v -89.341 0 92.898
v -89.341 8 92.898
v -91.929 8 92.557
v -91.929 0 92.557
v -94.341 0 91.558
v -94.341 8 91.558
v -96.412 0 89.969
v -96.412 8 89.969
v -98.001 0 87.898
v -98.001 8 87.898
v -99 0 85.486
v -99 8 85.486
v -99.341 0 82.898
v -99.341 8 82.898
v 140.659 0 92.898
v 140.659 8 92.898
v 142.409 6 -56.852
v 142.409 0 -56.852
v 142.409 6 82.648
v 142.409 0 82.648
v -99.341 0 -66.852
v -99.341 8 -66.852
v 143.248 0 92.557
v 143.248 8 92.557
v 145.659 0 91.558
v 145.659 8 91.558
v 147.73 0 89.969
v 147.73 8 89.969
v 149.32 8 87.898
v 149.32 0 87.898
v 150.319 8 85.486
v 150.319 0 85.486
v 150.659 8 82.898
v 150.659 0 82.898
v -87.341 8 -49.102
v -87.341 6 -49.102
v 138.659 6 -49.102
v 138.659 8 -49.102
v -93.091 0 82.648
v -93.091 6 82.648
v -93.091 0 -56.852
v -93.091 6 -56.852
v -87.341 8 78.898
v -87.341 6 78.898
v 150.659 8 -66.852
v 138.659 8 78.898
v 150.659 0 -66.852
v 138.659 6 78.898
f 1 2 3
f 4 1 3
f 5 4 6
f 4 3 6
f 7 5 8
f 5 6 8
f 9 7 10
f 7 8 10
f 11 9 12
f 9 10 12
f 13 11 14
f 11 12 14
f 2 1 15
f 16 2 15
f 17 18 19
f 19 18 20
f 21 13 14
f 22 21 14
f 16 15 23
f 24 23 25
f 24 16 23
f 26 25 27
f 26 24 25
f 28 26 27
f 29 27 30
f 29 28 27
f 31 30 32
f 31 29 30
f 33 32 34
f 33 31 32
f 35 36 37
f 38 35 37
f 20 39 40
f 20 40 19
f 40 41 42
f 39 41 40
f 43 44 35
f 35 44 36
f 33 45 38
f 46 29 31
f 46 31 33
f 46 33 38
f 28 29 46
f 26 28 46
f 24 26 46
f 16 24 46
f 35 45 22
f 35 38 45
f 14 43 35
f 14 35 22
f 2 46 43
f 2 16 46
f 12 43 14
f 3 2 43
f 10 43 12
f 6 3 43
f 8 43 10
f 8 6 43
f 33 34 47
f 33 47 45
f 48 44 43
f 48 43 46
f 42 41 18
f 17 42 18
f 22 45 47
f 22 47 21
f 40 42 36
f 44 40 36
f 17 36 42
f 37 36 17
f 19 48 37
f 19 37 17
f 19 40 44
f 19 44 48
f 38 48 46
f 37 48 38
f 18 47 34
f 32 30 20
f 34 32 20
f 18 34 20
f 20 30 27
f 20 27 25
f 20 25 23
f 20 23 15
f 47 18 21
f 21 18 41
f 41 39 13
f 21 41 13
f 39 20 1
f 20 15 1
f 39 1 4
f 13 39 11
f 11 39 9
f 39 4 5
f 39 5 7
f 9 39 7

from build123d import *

# Parameters (mm, degrees)
SKETCH_1_W          = 250
SKETCH_1_H          = 156
SKETCH_1_W_2        = 226
SKETCH_1_H_2        = 128
EXTRUDE_1_DEPTH     = 8
SKETCH_2_W          = 235.5
SKETCH_2_H          = 139.5
CUT_EXTRUDE_3_DEPTH = 6
SKETCH_11_W         = 250
SKETCH_11_H         = 8
EXTRUDE_3_DEPTH     = 3.75
CUT_EXTRUDE_4_DEPTH = 10


with BuildPart() as part:
    # 草图1 → 凸台-拉伸1 (new body)
    with BuildSketch(Plane(origin=(0, 0, 0), x_dir=(1, 0, 0), z_dir=(0, 1, 0))):
        with Locations((25.659327926, -14.898030127)):
            Rectangle(SKETCH_1_W, SKETCH_1_H)
        with Locations((25.659327926, -14.898030127)):
            Rectangle(SKETCH_1_W_2, SKETCH_1_H_2, mode=Mode.SUBTRACT)
    extrude(amount=EXTRUDE_1_DEPTH)

    # 草图2 → 切除-拉伸3 (cut)
    with BuildSketch(Plane.XZ):
        with Locations((24.659327926, 12.898030127)):
            Rectangle(SKETCH_2_W, SKETCH_2_H)
    extrude(amount=-CUT_EXTRUDE_3_DEPTH, mode=Mode.SUBTRACT)

    # 草图11 → 凸台-拉伸3 (add)
    with BuildSketch(Plane(origin=(0, 0, -63.101969873), x_dir=(-1, 0, 0), z_dir=(0, 0, -1))):
        with Locations((-25.659327926, 4)):
            Rectangle(SKETCH_11_W, SKETCH_11_H)
    extrude(amount=EXTRUDE_3_DEPTH)

    # 草图12 → 切除-拉伸4 (cut)
    with BuildSketch(Plane(origin=(0, 8, 0), x_dir=(1, 0, 0), z_dir=(0, 1, 0))):
        with BuildLine():
            Line((-99.340672074, -82.898030127), (-99.340672074, -92.898030127))
            Line((-99.340672074, -92.898030127), (-89.340672074, -92.898030127))
            ThreePointArc((-89.340672074, -92.898030127), (-96.411739886, -89.969097939), (-99.340672074, -82.898030127))
        make_face()
        with BuildLine():
            Line((150.659327926, -82.898030127), (150.659327926, -92.898030127))
            Line((150.659327926, -92.898030127), (140.659327926, -92.898030127))
            ThreePointArc((140.659327926, -92.898030127), (147.730395738, -89.969097939), (150.659327926, -82.898030127))
        make_face()
    extrude(amount=-CUT_EXTRUDE_4_DEPTH, mode=Mode.SUBTRACT)


solid = part.part
